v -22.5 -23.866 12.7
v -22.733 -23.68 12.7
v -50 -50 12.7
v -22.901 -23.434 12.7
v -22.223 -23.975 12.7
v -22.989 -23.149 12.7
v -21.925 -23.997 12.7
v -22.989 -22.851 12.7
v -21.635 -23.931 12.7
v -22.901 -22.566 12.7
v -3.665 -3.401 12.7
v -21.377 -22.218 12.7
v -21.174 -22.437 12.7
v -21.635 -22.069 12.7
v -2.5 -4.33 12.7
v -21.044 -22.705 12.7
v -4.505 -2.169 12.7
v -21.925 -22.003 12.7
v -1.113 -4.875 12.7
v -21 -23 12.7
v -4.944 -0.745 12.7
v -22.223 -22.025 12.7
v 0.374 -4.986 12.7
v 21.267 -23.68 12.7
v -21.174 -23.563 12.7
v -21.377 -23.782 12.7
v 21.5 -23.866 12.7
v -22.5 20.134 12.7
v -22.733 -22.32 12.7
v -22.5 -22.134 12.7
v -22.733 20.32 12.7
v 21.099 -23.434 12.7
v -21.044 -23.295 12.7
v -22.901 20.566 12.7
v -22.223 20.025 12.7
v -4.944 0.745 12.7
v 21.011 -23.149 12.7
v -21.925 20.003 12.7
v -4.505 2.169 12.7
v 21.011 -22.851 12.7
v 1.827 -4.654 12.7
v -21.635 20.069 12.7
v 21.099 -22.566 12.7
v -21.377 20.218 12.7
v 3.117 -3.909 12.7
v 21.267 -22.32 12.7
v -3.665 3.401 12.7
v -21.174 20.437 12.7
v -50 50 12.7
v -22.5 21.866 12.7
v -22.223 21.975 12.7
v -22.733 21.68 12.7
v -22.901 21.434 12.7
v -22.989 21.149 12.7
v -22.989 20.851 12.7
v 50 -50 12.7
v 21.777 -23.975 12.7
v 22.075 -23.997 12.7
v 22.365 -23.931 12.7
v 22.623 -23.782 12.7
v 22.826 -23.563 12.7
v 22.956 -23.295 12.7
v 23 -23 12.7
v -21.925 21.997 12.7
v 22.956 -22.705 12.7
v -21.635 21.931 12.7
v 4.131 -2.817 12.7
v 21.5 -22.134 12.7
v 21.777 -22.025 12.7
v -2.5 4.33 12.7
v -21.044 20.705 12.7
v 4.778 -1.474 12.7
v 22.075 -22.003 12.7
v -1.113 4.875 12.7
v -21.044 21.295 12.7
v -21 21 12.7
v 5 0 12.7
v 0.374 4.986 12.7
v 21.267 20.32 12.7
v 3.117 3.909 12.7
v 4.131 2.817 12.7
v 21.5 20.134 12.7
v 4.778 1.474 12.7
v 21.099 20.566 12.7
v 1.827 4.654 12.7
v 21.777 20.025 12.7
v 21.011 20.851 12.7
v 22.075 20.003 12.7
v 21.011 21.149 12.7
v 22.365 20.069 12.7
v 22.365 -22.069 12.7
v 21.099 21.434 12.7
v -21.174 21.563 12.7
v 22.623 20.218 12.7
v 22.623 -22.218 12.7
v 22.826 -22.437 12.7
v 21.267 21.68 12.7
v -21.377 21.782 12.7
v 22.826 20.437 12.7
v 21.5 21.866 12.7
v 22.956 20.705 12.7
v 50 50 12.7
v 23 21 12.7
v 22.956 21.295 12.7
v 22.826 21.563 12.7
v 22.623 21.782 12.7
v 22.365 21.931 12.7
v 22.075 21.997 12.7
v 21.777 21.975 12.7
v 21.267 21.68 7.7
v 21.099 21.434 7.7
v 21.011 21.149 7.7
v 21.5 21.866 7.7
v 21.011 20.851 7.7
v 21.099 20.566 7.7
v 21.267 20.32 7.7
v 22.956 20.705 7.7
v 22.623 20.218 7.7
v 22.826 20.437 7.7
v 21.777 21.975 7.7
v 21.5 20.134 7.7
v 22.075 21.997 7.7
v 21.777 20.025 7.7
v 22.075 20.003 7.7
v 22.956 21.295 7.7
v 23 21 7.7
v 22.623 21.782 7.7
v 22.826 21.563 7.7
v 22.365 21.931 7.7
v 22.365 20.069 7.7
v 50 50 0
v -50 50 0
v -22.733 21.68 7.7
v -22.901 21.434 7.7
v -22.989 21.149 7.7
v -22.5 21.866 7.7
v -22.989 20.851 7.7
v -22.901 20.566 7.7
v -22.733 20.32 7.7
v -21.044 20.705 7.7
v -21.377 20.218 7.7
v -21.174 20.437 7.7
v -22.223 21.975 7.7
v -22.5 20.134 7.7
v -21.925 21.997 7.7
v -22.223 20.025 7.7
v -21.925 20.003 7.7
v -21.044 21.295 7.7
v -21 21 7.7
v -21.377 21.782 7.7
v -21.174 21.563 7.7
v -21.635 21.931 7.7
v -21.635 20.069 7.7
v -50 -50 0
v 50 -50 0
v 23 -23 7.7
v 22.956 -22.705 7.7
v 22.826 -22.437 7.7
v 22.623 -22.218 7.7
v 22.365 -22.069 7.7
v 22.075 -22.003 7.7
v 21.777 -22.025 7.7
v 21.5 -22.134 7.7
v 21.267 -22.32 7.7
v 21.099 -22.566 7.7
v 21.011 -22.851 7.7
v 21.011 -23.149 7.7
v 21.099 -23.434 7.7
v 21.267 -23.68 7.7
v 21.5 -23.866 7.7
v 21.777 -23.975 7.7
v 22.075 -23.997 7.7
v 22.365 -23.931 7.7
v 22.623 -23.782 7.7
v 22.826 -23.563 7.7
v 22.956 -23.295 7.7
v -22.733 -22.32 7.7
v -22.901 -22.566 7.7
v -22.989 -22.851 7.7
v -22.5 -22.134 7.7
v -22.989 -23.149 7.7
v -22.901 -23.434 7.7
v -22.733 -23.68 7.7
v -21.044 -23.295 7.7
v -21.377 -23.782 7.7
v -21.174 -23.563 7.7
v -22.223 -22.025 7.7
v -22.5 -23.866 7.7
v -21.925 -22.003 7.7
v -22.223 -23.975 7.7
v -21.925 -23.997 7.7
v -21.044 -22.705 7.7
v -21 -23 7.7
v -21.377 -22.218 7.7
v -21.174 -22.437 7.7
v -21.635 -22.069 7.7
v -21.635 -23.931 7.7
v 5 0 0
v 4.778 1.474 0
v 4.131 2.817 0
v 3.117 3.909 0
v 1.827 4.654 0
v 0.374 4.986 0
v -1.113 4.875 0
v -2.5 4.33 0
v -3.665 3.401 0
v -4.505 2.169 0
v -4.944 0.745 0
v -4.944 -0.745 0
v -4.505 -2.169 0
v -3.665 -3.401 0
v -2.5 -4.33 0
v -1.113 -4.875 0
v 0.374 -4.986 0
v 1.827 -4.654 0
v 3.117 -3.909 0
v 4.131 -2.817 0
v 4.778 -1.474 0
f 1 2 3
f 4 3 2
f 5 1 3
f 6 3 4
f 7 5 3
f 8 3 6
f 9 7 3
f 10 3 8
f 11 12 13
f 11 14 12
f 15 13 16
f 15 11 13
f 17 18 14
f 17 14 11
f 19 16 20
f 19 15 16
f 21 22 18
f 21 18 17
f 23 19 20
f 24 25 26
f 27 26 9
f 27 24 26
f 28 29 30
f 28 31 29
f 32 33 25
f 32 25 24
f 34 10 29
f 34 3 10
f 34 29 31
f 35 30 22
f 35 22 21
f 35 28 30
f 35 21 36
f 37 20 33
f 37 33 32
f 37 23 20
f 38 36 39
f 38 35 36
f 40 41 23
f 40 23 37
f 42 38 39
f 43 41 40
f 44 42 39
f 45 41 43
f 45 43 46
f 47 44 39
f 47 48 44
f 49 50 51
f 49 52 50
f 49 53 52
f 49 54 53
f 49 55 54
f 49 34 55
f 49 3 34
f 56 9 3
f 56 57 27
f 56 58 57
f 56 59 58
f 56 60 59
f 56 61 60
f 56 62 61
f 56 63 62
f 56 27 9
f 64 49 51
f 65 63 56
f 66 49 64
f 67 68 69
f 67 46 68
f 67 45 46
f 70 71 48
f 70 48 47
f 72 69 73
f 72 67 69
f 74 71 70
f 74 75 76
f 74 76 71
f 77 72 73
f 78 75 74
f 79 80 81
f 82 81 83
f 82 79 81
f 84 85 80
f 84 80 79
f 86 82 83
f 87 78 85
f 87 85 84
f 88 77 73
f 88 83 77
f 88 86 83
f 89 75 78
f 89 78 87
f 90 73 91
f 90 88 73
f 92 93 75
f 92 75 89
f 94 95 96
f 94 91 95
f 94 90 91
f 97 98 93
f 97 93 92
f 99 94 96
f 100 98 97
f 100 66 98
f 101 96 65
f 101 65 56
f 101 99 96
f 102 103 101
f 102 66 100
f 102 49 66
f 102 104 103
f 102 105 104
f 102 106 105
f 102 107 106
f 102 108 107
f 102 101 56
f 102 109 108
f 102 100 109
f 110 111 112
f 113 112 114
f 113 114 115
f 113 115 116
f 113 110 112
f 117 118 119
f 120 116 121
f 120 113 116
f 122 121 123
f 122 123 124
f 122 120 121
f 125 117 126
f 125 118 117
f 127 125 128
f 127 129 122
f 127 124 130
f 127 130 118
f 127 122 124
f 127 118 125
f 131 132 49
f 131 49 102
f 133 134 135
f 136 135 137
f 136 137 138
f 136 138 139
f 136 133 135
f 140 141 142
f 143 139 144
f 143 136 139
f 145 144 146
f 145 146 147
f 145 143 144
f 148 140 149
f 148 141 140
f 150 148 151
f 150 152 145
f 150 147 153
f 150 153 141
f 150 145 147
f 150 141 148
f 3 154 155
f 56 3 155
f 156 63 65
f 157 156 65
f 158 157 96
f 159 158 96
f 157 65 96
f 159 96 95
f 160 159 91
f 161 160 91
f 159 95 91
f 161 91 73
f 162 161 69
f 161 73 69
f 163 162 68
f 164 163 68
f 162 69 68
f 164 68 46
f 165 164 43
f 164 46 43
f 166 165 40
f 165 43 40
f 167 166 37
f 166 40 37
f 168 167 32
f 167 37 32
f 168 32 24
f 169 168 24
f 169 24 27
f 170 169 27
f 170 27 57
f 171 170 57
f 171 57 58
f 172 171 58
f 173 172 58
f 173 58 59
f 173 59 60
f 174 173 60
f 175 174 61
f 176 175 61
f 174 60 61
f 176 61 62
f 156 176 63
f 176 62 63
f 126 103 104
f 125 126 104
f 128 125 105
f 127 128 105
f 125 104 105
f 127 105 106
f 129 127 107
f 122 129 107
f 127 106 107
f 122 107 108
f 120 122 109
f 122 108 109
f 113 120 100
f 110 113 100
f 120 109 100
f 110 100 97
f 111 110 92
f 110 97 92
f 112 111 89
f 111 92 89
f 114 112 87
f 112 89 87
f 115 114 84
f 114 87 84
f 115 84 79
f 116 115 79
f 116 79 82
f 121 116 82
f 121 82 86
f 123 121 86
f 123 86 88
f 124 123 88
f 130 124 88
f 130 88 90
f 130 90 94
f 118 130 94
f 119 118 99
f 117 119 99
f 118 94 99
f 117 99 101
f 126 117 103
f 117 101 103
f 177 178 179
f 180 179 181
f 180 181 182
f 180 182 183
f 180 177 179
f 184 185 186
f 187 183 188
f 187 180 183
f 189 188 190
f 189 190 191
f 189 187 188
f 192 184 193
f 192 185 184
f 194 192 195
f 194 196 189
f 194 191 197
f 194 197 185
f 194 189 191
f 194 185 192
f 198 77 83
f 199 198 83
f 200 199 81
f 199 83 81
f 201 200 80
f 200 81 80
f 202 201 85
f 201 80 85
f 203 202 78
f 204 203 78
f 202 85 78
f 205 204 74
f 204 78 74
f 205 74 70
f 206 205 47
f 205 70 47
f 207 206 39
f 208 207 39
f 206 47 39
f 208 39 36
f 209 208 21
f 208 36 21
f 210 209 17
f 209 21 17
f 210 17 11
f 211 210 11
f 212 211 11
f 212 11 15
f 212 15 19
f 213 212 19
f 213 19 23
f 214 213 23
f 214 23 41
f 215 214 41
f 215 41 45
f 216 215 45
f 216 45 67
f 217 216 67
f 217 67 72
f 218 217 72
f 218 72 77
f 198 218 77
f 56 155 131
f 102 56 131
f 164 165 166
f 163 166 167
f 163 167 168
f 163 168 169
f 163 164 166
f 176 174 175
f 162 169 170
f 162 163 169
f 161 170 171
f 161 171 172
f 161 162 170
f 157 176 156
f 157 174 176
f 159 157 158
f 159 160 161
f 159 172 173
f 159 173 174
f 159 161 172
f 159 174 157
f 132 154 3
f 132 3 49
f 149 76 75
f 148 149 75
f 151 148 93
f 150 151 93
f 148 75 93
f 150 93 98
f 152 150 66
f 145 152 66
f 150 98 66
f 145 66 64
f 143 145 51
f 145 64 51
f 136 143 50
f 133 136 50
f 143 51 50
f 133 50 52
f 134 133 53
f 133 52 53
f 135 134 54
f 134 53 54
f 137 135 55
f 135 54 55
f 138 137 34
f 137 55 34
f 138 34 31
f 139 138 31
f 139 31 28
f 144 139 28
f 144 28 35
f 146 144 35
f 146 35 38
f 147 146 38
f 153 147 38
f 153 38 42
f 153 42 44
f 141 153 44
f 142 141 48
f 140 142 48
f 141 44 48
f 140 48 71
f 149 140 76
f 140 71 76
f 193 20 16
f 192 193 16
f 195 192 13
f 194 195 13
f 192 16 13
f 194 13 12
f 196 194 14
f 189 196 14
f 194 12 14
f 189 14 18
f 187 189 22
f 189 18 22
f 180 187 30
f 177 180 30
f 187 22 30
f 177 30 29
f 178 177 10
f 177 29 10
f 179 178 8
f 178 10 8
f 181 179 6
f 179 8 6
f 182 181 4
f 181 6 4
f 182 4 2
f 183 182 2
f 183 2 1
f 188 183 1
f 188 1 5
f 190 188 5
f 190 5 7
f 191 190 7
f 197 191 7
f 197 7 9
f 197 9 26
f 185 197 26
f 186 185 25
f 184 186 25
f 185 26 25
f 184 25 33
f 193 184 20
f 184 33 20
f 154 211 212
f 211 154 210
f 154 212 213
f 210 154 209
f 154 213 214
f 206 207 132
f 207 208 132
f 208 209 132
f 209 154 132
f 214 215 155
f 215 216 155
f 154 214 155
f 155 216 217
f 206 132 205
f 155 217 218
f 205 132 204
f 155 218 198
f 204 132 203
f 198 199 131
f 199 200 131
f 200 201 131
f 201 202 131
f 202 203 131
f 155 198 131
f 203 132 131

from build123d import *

# Parameters (mm, degrees)
F0_W     = 100
F0_H     = 100
F1_DEPTH = 12.7
F2_R     = 5
F3_DEPTH = 25
F2_R_2   = 1
F4_DEPTH = 5


with BuildPart() as f1:
    # F0 (on Top) → F1 (new body)
    with BuildSketch(Plane.XY):
        Rectangle(F0_W, F0_H)
    extrude(amount=F1_DEPTH)

    # F2 (on face) → F3 (cut)
    with BuildSketch(Plane.XY.offset(12.7)):
        Circle(F2_R)
    extrude(amount=-F3_DEPTH, mode=Mode.SUBTRACT)

    # F2 (on face) → F4 (cut)
    with BuildSketch(Plane.XY.offset(12.7)):
        with Locations((-22, 21)):
            Circle(F2_R_2)
        with Locations((22, 21)):
            Circle(F2_R_2)
        with Locations((22, -23)):
            Circle(F2_R_2)
        with Locations((-22, -23)):
            Circle(F2_R_2)
    extrude(amount=-F4_DEPTH, mode=Mode.SUBTRACT)


solid = f1.part
